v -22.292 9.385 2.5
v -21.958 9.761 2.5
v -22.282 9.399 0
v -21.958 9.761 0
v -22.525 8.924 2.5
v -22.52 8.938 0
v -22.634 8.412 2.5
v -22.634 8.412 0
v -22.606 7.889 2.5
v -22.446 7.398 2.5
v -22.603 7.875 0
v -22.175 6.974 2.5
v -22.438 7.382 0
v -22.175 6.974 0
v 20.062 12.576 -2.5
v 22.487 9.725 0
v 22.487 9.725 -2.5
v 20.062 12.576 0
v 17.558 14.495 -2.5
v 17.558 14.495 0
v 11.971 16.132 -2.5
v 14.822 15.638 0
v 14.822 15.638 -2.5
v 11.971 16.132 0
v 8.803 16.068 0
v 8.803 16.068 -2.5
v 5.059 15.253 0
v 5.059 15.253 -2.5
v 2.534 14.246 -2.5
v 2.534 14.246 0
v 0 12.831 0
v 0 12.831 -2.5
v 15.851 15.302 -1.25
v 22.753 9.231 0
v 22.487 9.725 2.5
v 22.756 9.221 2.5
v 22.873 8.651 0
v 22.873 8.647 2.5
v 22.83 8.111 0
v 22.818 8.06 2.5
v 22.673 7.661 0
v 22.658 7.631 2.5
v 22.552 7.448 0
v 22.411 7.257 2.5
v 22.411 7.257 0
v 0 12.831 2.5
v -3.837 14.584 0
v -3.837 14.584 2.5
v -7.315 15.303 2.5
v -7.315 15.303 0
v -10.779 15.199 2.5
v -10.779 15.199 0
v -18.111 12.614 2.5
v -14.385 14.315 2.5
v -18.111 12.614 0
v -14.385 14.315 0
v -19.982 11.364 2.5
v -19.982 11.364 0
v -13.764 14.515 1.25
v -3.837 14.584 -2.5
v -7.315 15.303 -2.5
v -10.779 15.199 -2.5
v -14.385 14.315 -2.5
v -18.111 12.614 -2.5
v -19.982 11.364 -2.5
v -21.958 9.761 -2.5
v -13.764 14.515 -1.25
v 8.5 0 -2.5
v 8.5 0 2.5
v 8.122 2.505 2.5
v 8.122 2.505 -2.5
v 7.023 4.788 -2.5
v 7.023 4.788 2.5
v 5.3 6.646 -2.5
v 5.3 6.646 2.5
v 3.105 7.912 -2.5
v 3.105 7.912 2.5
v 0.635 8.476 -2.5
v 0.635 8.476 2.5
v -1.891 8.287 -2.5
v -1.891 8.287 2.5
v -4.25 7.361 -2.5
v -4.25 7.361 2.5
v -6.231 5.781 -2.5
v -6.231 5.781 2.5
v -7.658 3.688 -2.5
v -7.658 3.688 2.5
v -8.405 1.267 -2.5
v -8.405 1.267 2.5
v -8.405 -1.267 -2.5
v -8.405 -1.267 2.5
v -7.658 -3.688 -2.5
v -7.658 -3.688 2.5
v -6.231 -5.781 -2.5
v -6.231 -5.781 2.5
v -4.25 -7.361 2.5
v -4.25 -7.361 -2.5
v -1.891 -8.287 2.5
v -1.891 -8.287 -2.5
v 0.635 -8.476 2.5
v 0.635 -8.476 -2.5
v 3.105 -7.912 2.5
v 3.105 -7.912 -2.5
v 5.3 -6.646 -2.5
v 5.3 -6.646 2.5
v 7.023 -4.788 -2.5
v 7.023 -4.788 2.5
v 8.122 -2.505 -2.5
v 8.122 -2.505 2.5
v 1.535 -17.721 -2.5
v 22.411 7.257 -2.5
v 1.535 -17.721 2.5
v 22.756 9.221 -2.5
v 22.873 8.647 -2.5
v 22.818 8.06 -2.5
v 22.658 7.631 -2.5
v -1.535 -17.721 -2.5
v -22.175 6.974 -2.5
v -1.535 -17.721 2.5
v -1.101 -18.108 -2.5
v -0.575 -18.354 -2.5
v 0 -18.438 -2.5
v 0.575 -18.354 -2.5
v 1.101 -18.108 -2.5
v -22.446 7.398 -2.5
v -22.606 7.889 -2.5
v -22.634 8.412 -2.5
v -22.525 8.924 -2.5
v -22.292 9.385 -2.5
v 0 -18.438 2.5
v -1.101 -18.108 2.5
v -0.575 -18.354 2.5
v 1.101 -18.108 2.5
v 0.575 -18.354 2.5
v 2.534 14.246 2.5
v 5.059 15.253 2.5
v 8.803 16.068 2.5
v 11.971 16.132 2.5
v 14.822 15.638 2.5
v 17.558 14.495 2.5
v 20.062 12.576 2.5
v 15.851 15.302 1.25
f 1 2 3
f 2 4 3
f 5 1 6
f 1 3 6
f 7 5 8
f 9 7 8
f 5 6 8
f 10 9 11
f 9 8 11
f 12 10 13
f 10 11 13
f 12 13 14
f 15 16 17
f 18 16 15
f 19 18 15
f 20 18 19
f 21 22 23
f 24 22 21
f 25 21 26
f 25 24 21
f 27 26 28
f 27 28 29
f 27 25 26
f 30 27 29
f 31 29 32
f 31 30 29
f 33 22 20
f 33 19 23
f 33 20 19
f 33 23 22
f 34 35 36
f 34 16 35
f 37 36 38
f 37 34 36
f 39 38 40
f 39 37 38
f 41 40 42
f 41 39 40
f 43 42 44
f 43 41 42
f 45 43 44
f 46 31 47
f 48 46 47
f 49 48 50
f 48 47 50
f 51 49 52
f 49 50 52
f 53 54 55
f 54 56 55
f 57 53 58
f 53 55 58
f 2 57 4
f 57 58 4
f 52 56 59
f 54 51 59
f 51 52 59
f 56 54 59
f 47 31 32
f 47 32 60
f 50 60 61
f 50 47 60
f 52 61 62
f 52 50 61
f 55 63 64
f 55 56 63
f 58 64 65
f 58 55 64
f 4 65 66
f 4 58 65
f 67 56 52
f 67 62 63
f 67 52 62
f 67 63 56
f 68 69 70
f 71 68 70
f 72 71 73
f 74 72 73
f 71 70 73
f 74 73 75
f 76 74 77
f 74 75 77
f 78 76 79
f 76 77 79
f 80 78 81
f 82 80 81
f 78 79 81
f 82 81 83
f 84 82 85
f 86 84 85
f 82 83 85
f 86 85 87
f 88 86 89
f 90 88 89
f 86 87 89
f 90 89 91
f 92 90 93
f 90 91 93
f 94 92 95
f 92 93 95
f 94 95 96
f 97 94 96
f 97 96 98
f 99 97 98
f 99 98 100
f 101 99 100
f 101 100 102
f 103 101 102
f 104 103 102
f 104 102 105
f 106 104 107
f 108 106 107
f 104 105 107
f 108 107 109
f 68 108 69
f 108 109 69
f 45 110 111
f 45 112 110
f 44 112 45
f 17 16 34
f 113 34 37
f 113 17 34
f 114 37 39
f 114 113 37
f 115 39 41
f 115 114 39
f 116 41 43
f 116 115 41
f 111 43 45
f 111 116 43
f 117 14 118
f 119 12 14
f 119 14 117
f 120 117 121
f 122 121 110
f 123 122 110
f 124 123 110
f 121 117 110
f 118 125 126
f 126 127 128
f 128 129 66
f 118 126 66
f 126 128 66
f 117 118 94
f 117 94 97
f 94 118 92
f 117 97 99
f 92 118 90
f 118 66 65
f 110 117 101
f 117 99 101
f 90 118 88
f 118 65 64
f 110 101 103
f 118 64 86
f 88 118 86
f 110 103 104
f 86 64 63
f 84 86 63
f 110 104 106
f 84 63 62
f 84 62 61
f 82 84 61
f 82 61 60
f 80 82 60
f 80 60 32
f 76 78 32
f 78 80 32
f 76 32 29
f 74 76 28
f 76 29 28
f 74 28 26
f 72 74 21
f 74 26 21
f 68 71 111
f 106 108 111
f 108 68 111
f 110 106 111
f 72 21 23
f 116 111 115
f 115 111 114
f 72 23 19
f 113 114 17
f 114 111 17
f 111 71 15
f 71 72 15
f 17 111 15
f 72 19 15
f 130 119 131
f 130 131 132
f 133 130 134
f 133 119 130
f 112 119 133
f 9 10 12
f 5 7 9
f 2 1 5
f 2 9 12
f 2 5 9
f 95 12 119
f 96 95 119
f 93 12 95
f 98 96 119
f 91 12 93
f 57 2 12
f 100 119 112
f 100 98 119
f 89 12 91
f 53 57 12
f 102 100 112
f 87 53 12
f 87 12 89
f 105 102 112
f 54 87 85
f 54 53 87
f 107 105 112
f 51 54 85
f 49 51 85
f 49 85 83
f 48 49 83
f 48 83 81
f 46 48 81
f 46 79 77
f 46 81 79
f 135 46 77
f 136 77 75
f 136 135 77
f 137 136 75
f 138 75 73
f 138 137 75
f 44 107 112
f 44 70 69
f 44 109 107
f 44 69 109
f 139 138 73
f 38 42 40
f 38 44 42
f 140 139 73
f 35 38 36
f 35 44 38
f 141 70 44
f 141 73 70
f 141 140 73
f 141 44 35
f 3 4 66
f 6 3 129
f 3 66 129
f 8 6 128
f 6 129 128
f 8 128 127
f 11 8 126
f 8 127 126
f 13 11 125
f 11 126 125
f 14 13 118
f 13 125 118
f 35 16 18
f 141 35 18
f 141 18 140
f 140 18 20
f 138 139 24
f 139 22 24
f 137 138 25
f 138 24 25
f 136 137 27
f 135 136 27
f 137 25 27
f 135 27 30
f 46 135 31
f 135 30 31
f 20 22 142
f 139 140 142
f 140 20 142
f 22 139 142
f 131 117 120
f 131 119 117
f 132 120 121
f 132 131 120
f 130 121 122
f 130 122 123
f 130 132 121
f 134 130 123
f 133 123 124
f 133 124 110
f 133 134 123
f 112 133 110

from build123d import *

# Parameters (mm, degrees)
F1_DEPTH = 2.5
F2_R     = 8.5
F3_DEPTH = 5
F4_R     = 2


with BuildPart() as f1:
    # F0 (on Top) → F1 (new body, symmetric)
    with BuildSketch(Plane.XY):
        with BuildLine():
            add(Edge.make_bspline(
                [(0, 12.8306830302), (-5.6033253596, 16.1092708646), (-14.1634437691, 15.2185435642), (-19.7434784059, 11.930183225), (-23.3991518617, 8.4396265447)],
                knots=[0, 0, 0, 0, 0.5245675833, 1, 1, 1, 1], degree=3))
            Line((-23.3991518617, 8.4396265447), (0, -19.5570103824))
            Line((0, -19.5570103824), (23.3991537243, 8.4396265447))
            add(Edge.make_bspline(
                [(23.3991537243, 8.4396265447), (21.1730352272, 11.6721171587), (16.5383048632, 17.0813520932), (5.7577232004, 16.5454135329), (0, 12.8306830302)],
                knots=[0, 0, 0, 0, 0.4436460764, 1, 1, 1, 1], degree=3))
        make_face()
    extrude(amount=F1_DEPTH, both=True)

    # F2 (on face) → F3 (cut)
    with BuildSketch(Plane.XY.offset(2.5)):
        Circle(F2_R)
    extrude(amount=-F3_DEPTH, mode=Mode.SUBTRACT)

    # F4
    f4_edges = [f1.edges().sort_by_distance(p)[0] for p in [
        (-23.399152, 8.439627, -1.25),
        (-23.399152, 8.439627, 1.25),
        (23.399154, 8.439627, -1.25),
        (23.399154, 8.439627, 1.25),
        (0, -19.55701, 0),
    ]]
    fillet(f4_edges, radius=F4_R)


solid = f1.part
